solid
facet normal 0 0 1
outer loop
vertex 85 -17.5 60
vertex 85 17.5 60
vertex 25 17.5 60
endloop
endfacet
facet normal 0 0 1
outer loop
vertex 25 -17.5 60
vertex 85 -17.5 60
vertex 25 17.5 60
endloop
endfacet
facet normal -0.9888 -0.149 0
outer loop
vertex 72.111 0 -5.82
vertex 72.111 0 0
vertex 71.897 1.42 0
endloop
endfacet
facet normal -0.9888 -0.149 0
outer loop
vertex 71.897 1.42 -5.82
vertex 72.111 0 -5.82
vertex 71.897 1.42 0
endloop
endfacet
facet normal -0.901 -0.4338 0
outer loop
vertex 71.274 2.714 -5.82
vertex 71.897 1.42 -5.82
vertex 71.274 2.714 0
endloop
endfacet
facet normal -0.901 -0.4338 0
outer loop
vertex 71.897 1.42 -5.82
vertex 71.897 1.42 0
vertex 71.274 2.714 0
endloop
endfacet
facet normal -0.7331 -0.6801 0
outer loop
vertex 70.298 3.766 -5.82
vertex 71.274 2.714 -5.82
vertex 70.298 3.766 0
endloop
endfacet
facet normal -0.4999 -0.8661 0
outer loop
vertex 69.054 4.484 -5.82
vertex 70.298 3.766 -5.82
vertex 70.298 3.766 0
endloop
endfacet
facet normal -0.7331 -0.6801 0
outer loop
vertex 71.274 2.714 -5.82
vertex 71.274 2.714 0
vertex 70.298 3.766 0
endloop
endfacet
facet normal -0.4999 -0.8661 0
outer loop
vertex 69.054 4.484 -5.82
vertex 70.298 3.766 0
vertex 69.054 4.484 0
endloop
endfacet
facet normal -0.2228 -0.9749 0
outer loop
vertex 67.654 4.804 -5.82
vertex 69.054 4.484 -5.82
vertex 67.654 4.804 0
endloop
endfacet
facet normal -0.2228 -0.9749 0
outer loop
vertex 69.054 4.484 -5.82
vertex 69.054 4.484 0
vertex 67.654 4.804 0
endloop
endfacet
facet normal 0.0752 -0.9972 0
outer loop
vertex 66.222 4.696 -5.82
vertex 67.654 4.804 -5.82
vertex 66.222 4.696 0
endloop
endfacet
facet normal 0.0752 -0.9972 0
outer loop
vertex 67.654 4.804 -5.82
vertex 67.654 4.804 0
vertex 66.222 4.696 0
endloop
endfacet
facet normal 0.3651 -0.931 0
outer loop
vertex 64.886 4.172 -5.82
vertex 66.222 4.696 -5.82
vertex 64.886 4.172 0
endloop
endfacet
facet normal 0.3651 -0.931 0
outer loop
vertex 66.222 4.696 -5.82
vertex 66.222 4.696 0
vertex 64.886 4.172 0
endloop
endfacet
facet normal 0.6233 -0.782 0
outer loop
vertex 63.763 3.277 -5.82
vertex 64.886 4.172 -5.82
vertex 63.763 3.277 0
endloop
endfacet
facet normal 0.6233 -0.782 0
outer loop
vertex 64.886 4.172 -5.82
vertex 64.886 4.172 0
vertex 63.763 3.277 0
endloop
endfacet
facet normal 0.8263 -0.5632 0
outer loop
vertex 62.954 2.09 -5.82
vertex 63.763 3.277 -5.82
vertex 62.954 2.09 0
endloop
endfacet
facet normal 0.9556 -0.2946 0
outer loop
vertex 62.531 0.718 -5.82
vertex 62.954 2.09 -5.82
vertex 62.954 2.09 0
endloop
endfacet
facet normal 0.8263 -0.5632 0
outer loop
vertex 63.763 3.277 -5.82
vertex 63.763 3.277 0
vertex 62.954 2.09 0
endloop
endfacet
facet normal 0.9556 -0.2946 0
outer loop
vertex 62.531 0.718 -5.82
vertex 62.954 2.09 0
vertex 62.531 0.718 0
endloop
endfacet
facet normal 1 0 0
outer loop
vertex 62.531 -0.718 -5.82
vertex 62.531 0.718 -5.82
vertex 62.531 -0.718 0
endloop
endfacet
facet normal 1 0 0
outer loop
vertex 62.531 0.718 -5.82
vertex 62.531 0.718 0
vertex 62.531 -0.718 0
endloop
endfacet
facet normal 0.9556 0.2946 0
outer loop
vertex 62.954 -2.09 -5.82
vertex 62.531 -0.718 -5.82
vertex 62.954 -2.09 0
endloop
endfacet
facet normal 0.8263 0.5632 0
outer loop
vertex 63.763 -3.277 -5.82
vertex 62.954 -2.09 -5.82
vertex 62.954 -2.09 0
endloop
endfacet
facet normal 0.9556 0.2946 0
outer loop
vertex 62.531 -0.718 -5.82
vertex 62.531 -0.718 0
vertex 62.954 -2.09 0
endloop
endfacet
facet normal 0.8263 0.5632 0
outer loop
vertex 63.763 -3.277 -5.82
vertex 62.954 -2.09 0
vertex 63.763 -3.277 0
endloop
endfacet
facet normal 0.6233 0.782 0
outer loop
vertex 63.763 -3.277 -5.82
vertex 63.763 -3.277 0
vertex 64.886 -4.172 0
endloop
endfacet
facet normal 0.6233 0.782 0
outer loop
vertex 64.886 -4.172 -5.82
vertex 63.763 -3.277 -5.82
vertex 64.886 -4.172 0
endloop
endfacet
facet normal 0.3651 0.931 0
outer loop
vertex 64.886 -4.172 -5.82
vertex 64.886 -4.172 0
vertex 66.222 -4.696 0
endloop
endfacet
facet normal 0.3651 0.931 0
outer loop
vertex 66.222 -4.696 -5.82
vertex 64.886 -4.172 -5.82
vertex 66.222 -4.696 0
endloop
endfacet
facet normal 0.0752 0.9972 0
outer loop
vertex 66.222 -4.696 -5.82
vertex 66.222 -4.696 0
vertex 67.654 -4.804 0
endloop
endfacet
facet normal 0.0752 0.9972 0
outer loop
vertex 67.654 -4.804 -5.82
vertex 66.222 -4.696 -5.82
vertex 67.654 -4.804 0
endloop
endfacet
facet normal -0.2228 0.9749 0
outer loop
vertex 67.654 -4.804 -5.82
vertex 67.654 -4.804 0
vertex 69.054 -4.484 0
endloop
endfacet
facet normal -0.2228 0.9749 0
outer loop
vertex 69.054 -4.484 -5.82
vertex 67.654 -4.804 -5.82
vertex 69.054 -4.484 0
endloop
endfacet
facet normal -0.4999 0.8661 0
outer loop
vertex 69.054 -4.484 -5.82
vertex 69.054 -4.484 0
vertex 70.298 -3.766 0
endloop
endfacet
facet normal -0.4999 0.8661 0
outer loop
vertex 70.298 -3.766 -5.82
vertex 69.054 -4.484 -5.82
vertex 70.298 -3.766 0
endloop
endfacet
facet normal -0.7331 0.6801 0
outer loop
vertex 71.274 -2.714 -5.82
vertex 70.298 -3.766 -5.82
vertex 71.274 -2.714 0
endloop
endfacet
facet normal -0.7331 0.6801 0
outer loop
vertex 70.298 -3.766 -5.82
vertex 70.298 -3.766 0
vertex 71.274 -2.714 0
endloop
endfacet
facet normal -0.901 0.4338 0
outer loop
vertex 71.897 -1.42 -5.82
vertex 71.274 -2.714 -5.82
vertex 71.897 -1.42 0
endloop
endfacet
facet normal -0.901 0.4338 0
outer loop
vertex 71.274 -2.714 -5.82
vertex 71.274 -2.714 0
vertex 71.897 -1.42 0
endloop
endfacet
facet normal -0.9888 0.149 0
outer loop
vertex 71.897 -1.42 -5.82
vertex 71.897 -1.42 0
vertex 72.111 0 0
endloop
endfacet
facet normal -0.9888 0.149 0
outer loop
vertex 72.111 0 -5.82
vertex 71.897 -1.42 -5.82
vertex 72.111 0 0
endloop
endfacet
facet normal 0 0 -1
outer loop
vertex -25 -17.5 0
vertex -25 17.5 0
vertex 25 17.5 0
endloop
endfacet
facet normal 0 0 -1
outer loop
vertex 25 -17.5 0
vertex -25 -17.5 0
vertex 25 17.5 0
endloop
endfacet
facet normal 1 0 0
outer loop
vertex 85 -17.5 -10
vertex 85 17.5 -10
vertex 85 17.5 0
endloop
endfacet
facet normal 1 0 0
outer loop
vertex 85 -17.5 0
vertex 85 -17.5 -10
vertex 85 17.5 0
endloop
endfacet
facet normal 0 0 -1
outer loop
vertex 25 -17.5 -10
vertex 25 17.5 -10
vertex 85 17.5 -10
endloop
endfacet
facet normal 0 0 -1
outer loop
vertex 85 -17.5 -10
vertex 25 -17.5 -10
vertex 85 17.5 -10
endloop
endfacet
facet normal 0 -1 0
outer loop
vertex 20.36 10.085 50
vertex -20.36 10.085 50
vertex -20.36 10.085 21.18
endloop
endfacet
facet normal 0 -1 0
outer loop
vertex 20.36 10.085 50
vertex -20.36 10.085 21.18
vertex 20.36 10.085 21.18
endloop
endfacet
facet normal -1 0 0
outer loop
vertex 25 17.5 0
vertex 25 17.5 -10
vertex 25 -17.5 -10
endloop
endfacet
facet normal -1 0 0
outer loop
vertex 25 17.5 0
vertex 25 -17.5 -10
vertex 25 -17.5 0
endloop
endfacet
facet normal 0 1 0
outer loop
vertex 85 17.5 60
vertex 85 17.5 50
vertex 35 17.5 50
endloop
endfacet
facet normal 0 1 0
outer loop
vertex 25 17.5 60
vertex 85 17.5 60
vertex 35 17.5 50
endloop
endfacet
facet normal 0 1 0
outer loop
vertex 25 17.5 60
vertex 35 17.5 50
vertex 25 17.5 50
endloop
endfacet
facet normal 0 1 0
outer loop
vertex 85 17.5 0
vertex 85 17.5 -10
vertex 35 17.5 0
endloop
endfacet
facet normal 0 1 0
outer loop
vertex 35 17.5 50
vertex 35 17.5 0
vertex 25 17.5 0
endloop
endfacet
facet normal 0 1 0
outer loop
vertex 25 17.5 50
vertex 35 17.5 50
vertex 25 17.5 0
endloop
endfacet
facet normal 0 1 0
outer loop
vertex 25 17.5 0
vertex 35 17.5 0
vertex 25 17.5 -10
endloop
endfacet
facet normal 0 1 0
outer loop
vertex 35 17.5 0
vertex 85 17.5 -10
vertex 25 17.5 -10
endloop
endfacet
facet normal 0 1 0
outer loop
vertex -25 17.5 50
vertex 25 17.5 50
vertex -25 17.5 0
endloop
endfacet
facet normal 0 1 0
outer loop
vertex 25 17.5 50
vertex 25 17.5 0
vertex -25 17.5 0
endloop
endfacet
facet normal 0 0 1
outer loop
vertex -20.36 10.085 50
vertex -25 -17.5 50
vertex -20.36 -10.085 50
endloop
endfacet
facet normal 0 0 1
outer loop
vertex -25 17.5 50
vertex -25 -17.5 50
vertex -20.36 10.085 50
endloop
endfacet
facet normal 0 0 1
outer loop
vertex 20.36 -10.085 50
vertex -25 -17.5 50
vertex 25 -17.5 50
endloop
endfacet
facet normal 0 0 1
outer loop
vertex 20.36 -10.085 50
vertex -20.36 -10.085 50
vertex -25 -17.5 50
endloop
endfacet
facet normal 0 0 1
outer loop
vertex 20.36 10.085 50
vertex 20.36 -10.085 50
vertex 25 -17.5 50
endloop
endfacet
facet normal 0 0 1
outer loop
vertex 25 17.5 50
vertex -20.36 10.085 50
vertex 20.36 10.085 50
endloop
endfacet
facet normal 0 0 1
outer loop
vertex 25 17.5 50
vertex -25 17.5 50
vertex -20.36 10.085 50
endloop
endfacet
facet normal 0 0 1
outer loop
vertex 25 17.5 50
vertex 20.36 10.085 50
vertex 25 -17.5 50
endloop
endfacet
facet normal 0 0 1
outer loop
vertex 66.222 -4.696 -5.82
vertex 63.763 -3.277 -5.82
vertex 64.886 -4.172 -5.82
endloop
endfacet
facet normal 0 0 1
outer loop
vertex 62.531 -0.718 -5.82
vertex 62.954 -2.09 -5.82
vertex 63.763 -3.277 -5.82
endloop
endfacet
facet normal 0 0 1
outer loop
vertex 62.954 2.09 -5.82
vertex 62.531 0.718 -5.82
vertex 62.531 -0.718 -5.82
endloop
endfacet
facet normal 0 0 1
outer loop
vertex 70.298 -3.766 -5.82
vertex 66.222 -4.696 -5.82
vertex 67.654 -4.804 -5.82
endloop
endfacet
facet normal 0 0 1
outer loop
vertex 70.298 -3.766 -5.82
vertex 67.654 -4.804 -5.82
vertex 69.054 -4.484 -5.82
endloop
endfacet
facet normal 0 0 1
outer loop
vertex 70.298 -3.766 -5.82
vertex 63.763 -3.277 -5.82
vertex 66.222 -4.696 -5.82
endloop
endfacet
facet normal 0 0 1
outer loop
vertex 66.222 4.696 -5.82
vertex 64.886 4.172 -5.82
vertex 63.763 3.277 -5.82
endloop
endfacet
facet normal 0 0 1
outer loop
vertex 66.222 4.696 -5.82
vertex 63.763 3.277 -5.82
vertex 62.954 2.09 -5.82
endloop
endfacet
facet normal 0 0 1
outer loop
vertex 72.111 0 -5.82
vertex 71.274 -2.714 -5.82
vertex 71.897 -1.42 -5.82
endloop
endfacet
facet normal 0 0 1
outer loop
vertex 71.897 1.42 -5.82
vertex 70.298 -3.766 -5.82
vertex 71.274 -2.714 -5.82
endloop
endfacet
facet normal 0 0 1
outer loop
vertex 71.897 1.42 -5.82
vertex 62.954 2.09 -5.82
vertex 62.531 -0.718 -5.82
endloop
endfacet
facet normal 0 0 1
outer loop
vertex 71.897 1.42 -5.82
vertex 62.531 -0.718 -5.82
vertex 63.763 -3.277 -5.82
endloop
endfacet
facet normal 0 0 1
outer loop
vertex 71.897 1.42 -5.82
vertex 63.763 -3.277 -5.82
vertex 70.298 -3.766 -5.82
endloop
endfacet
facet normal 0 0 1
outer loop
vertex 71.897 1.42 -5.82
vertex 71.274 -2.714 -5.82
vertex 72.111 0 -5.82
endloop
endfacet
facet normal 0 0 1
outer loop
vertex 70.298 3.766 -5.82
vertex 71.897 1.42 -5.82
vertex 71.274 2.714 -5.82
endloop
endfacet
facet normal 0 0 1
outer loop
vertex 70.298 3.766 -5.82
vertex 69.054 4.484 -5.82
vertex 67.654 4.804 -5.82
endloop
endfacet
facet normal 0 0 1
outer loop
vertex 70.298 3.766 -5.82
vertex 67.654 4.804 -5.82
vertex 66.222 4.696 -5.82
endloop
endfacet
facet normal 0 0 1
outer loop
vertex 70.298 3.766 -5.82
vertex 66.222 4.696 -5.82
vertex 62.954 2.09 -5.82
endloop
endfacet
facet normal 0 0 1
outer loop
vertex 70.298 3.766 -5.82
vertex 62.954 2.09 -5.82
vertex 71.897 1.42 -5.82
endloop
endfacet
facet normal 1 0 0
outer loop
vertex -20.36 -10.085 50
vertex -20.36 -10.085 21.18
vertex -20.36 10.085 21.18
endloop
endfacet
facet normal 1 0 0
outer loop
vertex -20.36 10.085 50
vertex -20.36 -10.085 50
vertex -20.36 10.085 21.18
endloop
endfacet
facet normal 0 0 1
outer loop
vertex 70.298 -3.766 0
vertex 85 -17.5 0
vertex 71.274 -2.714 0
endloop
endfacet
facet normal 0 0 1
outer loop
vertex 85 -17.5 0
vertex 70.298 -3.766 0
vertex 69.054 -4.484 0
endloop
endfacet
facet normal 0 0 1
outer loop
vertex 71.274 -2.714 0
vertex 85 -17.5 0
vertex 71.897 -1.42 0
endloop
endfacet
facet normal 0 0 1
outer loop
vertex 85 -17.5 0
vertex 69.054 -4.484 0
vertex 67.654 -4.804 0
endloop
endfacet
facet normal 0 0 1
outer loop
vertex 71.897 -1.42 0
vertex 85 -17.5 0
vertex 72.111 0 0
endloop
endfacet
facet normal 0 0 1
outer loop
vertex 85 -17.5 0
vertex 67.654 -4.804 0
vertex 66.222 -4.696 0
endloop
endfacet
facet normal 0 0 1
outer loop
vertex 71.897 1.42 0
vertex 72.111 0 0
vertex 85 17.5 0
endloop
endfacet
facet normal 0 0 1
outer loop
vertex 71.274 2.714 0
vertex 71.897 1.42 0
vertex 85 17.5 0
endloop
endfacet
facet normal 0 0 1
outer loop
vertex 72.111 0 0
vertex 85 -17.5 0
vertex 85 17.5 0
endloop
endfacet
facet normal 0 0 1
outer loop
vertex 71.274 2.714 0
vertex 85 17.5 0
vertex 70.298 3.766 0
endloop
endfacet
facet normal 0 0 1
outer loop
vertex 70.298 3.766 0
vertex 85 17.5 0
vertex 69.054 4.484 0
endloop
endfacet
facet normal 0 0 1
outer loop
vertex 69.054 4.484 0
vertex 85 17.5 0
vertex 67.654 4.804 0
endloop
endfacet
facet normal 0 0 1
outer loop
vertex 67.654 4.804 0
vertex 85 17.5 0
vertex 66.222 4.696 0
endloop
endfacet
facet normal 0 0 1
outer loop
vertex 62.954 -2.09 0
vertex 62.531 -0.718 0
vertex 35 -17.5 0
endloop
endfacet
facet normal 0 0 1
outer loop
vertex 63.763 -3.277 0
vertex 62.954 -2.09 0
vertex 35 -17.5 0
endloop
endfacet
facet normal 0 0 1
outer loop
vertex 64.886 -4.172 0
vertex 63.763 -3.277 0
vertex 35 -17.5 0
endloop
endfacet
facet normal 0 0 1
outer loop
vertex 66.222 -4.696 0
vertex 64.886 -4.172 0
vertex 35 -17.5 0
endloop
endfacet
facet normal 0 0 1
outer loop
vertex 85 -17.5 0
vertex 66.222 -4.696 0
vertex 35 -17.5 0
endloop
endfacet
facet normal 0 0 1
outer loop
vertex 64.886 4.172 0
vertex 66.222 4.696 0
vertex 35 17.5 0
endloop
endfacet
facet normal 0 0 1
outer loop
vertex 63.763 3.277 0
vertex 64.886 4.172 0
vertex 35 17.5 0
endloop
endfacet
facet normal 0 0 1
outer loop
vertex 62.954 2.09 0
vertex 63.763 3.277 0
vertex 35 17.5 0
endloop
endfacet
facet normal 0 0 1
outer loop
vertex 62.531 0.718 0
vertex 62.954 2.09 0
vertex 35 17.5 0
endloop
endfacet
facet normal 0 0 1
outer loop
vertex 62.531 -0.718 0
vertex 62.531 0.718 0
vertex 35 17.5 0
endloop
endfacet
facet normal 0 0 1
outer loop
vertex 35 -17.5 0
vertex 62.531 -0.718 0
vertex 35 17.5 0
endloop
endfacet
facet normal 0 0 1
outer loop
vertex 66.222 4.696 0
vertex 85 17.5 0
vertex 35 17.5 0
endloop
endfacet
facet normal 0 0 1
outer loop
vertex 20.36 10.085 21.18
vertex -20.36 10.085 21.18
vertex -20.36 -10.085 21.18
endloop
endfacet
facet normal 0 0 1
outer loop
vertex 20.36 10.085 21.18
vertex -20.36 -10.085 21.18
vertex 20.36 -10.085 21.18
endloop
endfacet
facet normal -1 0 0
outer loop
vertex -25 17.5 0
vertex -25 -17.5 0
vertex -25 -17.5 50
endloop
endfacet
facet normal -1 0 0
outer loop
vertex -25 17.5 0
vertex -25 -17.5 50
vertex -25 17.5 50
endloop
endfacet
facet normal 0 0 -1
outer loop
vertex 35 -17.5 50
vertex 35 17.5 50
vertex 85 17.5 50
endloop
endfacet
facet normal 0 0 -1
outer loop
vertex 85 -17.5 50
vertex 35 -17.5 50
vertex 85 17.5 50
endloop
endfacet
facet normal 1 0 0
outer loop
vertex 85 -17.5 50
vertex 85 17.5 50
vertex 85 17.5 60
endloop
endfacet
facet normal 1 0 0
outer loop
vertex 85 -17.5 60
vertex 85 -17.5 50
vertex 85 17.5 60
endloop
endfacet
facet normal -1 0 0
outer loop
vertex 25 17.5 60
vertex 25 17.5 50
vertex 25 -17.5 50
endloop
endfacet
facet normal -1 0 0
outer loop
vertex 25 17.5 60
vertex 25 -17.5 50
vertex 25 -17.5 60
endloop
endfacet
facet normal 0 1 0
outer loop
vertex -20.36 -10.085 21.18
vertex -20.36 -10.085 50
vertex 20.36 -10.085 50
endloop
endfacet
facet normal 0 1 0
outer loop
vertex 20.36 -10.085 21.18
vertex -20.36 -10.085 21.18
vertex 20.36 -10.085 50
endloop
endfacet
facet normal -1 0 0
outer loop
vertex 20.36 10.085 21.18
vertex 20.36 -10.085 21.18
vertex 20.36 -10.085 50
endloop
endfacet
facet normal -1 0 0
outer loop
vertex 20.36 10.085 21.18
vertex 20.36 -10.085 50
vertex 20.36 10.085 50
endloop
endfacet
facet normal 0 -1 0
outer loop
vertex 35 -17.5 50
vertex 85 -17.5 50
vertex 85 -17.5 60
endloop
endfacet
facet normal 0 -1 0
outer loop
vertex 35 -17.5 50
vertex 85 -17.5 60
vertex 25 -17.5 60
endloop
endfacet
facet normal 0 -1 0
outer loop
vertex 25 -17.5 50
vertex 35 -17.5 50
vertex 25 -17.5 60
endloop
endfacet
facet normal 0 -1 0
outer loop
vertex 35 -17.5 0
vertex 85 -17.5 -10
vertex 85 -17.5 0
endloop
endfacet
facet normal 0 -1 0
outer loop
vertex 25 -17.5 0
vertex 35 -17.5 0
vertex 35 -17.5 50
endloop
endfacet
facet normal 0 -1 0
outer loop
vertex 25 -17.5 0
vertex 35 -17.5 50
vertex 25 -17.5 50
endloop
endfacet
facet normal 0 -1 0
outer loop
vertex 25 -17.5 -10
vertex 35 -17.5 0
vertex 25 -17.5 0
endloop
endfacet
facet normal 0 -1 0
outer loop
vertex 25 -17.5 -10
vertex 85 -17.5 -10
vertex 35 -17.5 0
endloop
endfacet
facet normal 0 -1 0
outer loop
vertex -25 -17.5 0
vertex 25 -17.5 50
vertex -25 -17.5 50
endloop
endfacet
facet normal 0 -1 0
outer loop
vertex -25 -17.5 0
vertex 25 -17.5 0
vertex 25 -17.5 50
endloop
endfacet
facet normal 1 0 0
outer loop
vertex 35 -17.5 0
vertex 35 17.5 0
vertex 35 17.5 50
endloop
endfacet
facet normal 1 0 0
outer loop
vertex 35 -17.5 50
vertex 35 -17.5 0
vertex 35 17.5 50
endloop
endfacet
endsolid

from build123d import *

# Parameters (mm, degrees)
SKETCH2_W           = 50
SKETCH2_H           = 35
BOSS_EXTRUDE1_DEPTH = 50
SKETCH3_W           = 40.72
SKETCH3_H           = 20.17
CUT_EXTRUDE1_DEPTH  = 28.82
BOSS_EXTRUDE2_DEPTH = 35
SKETCH5_R           = 4.817251836
CUT_EXTRUDE2_DEPTH  = 5.82


with BuildPart() as part:
    # Sketch2 → Boss-Extrude1 (new body)
    with BuildSketch(Plane.XY):
        Rectangle(SKETCH2_W, SKETCH2_H)
    extrude(amount=BOSS_EXTRUDE1_DEPTH)

    # Sketch3 → Cut-Extrude1 (cut)
    with BuildSketch(Plane.XY.offset(50)):
        Rectangle(SKETCH3_W, SKETCH3_H)
    extrude(amount=-CUT_EXTRUDE1_DEPTH, mode=Mode.SUBTRACT)

    # Sketch4 → Boss-Extrude2 (add)
    with BuildSketch(Plane(origin=(0, 17.5, 0), x_dir=(1, 0, 0), z_dir=(0, 1, 0))):
        Polygon((25, -50), (25, 0), (25, 10), (85, 10), (85, 0), (35, 0), (35, -50), (85, -50), (85, -60), (25, -60), align=None)
    extrude(amount=-BOSS_EXTRUDE2_DEPTH)

    # Sketch5 → Cut-Extrude2 (cut)
    with BuildSketch(Plane.XY):
        with Locations((67.294168967, 0)):
            Circle(SKETCH5_R)
    extrude(amount=-CUT_EXTRUDE2_DEPTH, mode=Mode.SUBTRACT)


solid = part.part
